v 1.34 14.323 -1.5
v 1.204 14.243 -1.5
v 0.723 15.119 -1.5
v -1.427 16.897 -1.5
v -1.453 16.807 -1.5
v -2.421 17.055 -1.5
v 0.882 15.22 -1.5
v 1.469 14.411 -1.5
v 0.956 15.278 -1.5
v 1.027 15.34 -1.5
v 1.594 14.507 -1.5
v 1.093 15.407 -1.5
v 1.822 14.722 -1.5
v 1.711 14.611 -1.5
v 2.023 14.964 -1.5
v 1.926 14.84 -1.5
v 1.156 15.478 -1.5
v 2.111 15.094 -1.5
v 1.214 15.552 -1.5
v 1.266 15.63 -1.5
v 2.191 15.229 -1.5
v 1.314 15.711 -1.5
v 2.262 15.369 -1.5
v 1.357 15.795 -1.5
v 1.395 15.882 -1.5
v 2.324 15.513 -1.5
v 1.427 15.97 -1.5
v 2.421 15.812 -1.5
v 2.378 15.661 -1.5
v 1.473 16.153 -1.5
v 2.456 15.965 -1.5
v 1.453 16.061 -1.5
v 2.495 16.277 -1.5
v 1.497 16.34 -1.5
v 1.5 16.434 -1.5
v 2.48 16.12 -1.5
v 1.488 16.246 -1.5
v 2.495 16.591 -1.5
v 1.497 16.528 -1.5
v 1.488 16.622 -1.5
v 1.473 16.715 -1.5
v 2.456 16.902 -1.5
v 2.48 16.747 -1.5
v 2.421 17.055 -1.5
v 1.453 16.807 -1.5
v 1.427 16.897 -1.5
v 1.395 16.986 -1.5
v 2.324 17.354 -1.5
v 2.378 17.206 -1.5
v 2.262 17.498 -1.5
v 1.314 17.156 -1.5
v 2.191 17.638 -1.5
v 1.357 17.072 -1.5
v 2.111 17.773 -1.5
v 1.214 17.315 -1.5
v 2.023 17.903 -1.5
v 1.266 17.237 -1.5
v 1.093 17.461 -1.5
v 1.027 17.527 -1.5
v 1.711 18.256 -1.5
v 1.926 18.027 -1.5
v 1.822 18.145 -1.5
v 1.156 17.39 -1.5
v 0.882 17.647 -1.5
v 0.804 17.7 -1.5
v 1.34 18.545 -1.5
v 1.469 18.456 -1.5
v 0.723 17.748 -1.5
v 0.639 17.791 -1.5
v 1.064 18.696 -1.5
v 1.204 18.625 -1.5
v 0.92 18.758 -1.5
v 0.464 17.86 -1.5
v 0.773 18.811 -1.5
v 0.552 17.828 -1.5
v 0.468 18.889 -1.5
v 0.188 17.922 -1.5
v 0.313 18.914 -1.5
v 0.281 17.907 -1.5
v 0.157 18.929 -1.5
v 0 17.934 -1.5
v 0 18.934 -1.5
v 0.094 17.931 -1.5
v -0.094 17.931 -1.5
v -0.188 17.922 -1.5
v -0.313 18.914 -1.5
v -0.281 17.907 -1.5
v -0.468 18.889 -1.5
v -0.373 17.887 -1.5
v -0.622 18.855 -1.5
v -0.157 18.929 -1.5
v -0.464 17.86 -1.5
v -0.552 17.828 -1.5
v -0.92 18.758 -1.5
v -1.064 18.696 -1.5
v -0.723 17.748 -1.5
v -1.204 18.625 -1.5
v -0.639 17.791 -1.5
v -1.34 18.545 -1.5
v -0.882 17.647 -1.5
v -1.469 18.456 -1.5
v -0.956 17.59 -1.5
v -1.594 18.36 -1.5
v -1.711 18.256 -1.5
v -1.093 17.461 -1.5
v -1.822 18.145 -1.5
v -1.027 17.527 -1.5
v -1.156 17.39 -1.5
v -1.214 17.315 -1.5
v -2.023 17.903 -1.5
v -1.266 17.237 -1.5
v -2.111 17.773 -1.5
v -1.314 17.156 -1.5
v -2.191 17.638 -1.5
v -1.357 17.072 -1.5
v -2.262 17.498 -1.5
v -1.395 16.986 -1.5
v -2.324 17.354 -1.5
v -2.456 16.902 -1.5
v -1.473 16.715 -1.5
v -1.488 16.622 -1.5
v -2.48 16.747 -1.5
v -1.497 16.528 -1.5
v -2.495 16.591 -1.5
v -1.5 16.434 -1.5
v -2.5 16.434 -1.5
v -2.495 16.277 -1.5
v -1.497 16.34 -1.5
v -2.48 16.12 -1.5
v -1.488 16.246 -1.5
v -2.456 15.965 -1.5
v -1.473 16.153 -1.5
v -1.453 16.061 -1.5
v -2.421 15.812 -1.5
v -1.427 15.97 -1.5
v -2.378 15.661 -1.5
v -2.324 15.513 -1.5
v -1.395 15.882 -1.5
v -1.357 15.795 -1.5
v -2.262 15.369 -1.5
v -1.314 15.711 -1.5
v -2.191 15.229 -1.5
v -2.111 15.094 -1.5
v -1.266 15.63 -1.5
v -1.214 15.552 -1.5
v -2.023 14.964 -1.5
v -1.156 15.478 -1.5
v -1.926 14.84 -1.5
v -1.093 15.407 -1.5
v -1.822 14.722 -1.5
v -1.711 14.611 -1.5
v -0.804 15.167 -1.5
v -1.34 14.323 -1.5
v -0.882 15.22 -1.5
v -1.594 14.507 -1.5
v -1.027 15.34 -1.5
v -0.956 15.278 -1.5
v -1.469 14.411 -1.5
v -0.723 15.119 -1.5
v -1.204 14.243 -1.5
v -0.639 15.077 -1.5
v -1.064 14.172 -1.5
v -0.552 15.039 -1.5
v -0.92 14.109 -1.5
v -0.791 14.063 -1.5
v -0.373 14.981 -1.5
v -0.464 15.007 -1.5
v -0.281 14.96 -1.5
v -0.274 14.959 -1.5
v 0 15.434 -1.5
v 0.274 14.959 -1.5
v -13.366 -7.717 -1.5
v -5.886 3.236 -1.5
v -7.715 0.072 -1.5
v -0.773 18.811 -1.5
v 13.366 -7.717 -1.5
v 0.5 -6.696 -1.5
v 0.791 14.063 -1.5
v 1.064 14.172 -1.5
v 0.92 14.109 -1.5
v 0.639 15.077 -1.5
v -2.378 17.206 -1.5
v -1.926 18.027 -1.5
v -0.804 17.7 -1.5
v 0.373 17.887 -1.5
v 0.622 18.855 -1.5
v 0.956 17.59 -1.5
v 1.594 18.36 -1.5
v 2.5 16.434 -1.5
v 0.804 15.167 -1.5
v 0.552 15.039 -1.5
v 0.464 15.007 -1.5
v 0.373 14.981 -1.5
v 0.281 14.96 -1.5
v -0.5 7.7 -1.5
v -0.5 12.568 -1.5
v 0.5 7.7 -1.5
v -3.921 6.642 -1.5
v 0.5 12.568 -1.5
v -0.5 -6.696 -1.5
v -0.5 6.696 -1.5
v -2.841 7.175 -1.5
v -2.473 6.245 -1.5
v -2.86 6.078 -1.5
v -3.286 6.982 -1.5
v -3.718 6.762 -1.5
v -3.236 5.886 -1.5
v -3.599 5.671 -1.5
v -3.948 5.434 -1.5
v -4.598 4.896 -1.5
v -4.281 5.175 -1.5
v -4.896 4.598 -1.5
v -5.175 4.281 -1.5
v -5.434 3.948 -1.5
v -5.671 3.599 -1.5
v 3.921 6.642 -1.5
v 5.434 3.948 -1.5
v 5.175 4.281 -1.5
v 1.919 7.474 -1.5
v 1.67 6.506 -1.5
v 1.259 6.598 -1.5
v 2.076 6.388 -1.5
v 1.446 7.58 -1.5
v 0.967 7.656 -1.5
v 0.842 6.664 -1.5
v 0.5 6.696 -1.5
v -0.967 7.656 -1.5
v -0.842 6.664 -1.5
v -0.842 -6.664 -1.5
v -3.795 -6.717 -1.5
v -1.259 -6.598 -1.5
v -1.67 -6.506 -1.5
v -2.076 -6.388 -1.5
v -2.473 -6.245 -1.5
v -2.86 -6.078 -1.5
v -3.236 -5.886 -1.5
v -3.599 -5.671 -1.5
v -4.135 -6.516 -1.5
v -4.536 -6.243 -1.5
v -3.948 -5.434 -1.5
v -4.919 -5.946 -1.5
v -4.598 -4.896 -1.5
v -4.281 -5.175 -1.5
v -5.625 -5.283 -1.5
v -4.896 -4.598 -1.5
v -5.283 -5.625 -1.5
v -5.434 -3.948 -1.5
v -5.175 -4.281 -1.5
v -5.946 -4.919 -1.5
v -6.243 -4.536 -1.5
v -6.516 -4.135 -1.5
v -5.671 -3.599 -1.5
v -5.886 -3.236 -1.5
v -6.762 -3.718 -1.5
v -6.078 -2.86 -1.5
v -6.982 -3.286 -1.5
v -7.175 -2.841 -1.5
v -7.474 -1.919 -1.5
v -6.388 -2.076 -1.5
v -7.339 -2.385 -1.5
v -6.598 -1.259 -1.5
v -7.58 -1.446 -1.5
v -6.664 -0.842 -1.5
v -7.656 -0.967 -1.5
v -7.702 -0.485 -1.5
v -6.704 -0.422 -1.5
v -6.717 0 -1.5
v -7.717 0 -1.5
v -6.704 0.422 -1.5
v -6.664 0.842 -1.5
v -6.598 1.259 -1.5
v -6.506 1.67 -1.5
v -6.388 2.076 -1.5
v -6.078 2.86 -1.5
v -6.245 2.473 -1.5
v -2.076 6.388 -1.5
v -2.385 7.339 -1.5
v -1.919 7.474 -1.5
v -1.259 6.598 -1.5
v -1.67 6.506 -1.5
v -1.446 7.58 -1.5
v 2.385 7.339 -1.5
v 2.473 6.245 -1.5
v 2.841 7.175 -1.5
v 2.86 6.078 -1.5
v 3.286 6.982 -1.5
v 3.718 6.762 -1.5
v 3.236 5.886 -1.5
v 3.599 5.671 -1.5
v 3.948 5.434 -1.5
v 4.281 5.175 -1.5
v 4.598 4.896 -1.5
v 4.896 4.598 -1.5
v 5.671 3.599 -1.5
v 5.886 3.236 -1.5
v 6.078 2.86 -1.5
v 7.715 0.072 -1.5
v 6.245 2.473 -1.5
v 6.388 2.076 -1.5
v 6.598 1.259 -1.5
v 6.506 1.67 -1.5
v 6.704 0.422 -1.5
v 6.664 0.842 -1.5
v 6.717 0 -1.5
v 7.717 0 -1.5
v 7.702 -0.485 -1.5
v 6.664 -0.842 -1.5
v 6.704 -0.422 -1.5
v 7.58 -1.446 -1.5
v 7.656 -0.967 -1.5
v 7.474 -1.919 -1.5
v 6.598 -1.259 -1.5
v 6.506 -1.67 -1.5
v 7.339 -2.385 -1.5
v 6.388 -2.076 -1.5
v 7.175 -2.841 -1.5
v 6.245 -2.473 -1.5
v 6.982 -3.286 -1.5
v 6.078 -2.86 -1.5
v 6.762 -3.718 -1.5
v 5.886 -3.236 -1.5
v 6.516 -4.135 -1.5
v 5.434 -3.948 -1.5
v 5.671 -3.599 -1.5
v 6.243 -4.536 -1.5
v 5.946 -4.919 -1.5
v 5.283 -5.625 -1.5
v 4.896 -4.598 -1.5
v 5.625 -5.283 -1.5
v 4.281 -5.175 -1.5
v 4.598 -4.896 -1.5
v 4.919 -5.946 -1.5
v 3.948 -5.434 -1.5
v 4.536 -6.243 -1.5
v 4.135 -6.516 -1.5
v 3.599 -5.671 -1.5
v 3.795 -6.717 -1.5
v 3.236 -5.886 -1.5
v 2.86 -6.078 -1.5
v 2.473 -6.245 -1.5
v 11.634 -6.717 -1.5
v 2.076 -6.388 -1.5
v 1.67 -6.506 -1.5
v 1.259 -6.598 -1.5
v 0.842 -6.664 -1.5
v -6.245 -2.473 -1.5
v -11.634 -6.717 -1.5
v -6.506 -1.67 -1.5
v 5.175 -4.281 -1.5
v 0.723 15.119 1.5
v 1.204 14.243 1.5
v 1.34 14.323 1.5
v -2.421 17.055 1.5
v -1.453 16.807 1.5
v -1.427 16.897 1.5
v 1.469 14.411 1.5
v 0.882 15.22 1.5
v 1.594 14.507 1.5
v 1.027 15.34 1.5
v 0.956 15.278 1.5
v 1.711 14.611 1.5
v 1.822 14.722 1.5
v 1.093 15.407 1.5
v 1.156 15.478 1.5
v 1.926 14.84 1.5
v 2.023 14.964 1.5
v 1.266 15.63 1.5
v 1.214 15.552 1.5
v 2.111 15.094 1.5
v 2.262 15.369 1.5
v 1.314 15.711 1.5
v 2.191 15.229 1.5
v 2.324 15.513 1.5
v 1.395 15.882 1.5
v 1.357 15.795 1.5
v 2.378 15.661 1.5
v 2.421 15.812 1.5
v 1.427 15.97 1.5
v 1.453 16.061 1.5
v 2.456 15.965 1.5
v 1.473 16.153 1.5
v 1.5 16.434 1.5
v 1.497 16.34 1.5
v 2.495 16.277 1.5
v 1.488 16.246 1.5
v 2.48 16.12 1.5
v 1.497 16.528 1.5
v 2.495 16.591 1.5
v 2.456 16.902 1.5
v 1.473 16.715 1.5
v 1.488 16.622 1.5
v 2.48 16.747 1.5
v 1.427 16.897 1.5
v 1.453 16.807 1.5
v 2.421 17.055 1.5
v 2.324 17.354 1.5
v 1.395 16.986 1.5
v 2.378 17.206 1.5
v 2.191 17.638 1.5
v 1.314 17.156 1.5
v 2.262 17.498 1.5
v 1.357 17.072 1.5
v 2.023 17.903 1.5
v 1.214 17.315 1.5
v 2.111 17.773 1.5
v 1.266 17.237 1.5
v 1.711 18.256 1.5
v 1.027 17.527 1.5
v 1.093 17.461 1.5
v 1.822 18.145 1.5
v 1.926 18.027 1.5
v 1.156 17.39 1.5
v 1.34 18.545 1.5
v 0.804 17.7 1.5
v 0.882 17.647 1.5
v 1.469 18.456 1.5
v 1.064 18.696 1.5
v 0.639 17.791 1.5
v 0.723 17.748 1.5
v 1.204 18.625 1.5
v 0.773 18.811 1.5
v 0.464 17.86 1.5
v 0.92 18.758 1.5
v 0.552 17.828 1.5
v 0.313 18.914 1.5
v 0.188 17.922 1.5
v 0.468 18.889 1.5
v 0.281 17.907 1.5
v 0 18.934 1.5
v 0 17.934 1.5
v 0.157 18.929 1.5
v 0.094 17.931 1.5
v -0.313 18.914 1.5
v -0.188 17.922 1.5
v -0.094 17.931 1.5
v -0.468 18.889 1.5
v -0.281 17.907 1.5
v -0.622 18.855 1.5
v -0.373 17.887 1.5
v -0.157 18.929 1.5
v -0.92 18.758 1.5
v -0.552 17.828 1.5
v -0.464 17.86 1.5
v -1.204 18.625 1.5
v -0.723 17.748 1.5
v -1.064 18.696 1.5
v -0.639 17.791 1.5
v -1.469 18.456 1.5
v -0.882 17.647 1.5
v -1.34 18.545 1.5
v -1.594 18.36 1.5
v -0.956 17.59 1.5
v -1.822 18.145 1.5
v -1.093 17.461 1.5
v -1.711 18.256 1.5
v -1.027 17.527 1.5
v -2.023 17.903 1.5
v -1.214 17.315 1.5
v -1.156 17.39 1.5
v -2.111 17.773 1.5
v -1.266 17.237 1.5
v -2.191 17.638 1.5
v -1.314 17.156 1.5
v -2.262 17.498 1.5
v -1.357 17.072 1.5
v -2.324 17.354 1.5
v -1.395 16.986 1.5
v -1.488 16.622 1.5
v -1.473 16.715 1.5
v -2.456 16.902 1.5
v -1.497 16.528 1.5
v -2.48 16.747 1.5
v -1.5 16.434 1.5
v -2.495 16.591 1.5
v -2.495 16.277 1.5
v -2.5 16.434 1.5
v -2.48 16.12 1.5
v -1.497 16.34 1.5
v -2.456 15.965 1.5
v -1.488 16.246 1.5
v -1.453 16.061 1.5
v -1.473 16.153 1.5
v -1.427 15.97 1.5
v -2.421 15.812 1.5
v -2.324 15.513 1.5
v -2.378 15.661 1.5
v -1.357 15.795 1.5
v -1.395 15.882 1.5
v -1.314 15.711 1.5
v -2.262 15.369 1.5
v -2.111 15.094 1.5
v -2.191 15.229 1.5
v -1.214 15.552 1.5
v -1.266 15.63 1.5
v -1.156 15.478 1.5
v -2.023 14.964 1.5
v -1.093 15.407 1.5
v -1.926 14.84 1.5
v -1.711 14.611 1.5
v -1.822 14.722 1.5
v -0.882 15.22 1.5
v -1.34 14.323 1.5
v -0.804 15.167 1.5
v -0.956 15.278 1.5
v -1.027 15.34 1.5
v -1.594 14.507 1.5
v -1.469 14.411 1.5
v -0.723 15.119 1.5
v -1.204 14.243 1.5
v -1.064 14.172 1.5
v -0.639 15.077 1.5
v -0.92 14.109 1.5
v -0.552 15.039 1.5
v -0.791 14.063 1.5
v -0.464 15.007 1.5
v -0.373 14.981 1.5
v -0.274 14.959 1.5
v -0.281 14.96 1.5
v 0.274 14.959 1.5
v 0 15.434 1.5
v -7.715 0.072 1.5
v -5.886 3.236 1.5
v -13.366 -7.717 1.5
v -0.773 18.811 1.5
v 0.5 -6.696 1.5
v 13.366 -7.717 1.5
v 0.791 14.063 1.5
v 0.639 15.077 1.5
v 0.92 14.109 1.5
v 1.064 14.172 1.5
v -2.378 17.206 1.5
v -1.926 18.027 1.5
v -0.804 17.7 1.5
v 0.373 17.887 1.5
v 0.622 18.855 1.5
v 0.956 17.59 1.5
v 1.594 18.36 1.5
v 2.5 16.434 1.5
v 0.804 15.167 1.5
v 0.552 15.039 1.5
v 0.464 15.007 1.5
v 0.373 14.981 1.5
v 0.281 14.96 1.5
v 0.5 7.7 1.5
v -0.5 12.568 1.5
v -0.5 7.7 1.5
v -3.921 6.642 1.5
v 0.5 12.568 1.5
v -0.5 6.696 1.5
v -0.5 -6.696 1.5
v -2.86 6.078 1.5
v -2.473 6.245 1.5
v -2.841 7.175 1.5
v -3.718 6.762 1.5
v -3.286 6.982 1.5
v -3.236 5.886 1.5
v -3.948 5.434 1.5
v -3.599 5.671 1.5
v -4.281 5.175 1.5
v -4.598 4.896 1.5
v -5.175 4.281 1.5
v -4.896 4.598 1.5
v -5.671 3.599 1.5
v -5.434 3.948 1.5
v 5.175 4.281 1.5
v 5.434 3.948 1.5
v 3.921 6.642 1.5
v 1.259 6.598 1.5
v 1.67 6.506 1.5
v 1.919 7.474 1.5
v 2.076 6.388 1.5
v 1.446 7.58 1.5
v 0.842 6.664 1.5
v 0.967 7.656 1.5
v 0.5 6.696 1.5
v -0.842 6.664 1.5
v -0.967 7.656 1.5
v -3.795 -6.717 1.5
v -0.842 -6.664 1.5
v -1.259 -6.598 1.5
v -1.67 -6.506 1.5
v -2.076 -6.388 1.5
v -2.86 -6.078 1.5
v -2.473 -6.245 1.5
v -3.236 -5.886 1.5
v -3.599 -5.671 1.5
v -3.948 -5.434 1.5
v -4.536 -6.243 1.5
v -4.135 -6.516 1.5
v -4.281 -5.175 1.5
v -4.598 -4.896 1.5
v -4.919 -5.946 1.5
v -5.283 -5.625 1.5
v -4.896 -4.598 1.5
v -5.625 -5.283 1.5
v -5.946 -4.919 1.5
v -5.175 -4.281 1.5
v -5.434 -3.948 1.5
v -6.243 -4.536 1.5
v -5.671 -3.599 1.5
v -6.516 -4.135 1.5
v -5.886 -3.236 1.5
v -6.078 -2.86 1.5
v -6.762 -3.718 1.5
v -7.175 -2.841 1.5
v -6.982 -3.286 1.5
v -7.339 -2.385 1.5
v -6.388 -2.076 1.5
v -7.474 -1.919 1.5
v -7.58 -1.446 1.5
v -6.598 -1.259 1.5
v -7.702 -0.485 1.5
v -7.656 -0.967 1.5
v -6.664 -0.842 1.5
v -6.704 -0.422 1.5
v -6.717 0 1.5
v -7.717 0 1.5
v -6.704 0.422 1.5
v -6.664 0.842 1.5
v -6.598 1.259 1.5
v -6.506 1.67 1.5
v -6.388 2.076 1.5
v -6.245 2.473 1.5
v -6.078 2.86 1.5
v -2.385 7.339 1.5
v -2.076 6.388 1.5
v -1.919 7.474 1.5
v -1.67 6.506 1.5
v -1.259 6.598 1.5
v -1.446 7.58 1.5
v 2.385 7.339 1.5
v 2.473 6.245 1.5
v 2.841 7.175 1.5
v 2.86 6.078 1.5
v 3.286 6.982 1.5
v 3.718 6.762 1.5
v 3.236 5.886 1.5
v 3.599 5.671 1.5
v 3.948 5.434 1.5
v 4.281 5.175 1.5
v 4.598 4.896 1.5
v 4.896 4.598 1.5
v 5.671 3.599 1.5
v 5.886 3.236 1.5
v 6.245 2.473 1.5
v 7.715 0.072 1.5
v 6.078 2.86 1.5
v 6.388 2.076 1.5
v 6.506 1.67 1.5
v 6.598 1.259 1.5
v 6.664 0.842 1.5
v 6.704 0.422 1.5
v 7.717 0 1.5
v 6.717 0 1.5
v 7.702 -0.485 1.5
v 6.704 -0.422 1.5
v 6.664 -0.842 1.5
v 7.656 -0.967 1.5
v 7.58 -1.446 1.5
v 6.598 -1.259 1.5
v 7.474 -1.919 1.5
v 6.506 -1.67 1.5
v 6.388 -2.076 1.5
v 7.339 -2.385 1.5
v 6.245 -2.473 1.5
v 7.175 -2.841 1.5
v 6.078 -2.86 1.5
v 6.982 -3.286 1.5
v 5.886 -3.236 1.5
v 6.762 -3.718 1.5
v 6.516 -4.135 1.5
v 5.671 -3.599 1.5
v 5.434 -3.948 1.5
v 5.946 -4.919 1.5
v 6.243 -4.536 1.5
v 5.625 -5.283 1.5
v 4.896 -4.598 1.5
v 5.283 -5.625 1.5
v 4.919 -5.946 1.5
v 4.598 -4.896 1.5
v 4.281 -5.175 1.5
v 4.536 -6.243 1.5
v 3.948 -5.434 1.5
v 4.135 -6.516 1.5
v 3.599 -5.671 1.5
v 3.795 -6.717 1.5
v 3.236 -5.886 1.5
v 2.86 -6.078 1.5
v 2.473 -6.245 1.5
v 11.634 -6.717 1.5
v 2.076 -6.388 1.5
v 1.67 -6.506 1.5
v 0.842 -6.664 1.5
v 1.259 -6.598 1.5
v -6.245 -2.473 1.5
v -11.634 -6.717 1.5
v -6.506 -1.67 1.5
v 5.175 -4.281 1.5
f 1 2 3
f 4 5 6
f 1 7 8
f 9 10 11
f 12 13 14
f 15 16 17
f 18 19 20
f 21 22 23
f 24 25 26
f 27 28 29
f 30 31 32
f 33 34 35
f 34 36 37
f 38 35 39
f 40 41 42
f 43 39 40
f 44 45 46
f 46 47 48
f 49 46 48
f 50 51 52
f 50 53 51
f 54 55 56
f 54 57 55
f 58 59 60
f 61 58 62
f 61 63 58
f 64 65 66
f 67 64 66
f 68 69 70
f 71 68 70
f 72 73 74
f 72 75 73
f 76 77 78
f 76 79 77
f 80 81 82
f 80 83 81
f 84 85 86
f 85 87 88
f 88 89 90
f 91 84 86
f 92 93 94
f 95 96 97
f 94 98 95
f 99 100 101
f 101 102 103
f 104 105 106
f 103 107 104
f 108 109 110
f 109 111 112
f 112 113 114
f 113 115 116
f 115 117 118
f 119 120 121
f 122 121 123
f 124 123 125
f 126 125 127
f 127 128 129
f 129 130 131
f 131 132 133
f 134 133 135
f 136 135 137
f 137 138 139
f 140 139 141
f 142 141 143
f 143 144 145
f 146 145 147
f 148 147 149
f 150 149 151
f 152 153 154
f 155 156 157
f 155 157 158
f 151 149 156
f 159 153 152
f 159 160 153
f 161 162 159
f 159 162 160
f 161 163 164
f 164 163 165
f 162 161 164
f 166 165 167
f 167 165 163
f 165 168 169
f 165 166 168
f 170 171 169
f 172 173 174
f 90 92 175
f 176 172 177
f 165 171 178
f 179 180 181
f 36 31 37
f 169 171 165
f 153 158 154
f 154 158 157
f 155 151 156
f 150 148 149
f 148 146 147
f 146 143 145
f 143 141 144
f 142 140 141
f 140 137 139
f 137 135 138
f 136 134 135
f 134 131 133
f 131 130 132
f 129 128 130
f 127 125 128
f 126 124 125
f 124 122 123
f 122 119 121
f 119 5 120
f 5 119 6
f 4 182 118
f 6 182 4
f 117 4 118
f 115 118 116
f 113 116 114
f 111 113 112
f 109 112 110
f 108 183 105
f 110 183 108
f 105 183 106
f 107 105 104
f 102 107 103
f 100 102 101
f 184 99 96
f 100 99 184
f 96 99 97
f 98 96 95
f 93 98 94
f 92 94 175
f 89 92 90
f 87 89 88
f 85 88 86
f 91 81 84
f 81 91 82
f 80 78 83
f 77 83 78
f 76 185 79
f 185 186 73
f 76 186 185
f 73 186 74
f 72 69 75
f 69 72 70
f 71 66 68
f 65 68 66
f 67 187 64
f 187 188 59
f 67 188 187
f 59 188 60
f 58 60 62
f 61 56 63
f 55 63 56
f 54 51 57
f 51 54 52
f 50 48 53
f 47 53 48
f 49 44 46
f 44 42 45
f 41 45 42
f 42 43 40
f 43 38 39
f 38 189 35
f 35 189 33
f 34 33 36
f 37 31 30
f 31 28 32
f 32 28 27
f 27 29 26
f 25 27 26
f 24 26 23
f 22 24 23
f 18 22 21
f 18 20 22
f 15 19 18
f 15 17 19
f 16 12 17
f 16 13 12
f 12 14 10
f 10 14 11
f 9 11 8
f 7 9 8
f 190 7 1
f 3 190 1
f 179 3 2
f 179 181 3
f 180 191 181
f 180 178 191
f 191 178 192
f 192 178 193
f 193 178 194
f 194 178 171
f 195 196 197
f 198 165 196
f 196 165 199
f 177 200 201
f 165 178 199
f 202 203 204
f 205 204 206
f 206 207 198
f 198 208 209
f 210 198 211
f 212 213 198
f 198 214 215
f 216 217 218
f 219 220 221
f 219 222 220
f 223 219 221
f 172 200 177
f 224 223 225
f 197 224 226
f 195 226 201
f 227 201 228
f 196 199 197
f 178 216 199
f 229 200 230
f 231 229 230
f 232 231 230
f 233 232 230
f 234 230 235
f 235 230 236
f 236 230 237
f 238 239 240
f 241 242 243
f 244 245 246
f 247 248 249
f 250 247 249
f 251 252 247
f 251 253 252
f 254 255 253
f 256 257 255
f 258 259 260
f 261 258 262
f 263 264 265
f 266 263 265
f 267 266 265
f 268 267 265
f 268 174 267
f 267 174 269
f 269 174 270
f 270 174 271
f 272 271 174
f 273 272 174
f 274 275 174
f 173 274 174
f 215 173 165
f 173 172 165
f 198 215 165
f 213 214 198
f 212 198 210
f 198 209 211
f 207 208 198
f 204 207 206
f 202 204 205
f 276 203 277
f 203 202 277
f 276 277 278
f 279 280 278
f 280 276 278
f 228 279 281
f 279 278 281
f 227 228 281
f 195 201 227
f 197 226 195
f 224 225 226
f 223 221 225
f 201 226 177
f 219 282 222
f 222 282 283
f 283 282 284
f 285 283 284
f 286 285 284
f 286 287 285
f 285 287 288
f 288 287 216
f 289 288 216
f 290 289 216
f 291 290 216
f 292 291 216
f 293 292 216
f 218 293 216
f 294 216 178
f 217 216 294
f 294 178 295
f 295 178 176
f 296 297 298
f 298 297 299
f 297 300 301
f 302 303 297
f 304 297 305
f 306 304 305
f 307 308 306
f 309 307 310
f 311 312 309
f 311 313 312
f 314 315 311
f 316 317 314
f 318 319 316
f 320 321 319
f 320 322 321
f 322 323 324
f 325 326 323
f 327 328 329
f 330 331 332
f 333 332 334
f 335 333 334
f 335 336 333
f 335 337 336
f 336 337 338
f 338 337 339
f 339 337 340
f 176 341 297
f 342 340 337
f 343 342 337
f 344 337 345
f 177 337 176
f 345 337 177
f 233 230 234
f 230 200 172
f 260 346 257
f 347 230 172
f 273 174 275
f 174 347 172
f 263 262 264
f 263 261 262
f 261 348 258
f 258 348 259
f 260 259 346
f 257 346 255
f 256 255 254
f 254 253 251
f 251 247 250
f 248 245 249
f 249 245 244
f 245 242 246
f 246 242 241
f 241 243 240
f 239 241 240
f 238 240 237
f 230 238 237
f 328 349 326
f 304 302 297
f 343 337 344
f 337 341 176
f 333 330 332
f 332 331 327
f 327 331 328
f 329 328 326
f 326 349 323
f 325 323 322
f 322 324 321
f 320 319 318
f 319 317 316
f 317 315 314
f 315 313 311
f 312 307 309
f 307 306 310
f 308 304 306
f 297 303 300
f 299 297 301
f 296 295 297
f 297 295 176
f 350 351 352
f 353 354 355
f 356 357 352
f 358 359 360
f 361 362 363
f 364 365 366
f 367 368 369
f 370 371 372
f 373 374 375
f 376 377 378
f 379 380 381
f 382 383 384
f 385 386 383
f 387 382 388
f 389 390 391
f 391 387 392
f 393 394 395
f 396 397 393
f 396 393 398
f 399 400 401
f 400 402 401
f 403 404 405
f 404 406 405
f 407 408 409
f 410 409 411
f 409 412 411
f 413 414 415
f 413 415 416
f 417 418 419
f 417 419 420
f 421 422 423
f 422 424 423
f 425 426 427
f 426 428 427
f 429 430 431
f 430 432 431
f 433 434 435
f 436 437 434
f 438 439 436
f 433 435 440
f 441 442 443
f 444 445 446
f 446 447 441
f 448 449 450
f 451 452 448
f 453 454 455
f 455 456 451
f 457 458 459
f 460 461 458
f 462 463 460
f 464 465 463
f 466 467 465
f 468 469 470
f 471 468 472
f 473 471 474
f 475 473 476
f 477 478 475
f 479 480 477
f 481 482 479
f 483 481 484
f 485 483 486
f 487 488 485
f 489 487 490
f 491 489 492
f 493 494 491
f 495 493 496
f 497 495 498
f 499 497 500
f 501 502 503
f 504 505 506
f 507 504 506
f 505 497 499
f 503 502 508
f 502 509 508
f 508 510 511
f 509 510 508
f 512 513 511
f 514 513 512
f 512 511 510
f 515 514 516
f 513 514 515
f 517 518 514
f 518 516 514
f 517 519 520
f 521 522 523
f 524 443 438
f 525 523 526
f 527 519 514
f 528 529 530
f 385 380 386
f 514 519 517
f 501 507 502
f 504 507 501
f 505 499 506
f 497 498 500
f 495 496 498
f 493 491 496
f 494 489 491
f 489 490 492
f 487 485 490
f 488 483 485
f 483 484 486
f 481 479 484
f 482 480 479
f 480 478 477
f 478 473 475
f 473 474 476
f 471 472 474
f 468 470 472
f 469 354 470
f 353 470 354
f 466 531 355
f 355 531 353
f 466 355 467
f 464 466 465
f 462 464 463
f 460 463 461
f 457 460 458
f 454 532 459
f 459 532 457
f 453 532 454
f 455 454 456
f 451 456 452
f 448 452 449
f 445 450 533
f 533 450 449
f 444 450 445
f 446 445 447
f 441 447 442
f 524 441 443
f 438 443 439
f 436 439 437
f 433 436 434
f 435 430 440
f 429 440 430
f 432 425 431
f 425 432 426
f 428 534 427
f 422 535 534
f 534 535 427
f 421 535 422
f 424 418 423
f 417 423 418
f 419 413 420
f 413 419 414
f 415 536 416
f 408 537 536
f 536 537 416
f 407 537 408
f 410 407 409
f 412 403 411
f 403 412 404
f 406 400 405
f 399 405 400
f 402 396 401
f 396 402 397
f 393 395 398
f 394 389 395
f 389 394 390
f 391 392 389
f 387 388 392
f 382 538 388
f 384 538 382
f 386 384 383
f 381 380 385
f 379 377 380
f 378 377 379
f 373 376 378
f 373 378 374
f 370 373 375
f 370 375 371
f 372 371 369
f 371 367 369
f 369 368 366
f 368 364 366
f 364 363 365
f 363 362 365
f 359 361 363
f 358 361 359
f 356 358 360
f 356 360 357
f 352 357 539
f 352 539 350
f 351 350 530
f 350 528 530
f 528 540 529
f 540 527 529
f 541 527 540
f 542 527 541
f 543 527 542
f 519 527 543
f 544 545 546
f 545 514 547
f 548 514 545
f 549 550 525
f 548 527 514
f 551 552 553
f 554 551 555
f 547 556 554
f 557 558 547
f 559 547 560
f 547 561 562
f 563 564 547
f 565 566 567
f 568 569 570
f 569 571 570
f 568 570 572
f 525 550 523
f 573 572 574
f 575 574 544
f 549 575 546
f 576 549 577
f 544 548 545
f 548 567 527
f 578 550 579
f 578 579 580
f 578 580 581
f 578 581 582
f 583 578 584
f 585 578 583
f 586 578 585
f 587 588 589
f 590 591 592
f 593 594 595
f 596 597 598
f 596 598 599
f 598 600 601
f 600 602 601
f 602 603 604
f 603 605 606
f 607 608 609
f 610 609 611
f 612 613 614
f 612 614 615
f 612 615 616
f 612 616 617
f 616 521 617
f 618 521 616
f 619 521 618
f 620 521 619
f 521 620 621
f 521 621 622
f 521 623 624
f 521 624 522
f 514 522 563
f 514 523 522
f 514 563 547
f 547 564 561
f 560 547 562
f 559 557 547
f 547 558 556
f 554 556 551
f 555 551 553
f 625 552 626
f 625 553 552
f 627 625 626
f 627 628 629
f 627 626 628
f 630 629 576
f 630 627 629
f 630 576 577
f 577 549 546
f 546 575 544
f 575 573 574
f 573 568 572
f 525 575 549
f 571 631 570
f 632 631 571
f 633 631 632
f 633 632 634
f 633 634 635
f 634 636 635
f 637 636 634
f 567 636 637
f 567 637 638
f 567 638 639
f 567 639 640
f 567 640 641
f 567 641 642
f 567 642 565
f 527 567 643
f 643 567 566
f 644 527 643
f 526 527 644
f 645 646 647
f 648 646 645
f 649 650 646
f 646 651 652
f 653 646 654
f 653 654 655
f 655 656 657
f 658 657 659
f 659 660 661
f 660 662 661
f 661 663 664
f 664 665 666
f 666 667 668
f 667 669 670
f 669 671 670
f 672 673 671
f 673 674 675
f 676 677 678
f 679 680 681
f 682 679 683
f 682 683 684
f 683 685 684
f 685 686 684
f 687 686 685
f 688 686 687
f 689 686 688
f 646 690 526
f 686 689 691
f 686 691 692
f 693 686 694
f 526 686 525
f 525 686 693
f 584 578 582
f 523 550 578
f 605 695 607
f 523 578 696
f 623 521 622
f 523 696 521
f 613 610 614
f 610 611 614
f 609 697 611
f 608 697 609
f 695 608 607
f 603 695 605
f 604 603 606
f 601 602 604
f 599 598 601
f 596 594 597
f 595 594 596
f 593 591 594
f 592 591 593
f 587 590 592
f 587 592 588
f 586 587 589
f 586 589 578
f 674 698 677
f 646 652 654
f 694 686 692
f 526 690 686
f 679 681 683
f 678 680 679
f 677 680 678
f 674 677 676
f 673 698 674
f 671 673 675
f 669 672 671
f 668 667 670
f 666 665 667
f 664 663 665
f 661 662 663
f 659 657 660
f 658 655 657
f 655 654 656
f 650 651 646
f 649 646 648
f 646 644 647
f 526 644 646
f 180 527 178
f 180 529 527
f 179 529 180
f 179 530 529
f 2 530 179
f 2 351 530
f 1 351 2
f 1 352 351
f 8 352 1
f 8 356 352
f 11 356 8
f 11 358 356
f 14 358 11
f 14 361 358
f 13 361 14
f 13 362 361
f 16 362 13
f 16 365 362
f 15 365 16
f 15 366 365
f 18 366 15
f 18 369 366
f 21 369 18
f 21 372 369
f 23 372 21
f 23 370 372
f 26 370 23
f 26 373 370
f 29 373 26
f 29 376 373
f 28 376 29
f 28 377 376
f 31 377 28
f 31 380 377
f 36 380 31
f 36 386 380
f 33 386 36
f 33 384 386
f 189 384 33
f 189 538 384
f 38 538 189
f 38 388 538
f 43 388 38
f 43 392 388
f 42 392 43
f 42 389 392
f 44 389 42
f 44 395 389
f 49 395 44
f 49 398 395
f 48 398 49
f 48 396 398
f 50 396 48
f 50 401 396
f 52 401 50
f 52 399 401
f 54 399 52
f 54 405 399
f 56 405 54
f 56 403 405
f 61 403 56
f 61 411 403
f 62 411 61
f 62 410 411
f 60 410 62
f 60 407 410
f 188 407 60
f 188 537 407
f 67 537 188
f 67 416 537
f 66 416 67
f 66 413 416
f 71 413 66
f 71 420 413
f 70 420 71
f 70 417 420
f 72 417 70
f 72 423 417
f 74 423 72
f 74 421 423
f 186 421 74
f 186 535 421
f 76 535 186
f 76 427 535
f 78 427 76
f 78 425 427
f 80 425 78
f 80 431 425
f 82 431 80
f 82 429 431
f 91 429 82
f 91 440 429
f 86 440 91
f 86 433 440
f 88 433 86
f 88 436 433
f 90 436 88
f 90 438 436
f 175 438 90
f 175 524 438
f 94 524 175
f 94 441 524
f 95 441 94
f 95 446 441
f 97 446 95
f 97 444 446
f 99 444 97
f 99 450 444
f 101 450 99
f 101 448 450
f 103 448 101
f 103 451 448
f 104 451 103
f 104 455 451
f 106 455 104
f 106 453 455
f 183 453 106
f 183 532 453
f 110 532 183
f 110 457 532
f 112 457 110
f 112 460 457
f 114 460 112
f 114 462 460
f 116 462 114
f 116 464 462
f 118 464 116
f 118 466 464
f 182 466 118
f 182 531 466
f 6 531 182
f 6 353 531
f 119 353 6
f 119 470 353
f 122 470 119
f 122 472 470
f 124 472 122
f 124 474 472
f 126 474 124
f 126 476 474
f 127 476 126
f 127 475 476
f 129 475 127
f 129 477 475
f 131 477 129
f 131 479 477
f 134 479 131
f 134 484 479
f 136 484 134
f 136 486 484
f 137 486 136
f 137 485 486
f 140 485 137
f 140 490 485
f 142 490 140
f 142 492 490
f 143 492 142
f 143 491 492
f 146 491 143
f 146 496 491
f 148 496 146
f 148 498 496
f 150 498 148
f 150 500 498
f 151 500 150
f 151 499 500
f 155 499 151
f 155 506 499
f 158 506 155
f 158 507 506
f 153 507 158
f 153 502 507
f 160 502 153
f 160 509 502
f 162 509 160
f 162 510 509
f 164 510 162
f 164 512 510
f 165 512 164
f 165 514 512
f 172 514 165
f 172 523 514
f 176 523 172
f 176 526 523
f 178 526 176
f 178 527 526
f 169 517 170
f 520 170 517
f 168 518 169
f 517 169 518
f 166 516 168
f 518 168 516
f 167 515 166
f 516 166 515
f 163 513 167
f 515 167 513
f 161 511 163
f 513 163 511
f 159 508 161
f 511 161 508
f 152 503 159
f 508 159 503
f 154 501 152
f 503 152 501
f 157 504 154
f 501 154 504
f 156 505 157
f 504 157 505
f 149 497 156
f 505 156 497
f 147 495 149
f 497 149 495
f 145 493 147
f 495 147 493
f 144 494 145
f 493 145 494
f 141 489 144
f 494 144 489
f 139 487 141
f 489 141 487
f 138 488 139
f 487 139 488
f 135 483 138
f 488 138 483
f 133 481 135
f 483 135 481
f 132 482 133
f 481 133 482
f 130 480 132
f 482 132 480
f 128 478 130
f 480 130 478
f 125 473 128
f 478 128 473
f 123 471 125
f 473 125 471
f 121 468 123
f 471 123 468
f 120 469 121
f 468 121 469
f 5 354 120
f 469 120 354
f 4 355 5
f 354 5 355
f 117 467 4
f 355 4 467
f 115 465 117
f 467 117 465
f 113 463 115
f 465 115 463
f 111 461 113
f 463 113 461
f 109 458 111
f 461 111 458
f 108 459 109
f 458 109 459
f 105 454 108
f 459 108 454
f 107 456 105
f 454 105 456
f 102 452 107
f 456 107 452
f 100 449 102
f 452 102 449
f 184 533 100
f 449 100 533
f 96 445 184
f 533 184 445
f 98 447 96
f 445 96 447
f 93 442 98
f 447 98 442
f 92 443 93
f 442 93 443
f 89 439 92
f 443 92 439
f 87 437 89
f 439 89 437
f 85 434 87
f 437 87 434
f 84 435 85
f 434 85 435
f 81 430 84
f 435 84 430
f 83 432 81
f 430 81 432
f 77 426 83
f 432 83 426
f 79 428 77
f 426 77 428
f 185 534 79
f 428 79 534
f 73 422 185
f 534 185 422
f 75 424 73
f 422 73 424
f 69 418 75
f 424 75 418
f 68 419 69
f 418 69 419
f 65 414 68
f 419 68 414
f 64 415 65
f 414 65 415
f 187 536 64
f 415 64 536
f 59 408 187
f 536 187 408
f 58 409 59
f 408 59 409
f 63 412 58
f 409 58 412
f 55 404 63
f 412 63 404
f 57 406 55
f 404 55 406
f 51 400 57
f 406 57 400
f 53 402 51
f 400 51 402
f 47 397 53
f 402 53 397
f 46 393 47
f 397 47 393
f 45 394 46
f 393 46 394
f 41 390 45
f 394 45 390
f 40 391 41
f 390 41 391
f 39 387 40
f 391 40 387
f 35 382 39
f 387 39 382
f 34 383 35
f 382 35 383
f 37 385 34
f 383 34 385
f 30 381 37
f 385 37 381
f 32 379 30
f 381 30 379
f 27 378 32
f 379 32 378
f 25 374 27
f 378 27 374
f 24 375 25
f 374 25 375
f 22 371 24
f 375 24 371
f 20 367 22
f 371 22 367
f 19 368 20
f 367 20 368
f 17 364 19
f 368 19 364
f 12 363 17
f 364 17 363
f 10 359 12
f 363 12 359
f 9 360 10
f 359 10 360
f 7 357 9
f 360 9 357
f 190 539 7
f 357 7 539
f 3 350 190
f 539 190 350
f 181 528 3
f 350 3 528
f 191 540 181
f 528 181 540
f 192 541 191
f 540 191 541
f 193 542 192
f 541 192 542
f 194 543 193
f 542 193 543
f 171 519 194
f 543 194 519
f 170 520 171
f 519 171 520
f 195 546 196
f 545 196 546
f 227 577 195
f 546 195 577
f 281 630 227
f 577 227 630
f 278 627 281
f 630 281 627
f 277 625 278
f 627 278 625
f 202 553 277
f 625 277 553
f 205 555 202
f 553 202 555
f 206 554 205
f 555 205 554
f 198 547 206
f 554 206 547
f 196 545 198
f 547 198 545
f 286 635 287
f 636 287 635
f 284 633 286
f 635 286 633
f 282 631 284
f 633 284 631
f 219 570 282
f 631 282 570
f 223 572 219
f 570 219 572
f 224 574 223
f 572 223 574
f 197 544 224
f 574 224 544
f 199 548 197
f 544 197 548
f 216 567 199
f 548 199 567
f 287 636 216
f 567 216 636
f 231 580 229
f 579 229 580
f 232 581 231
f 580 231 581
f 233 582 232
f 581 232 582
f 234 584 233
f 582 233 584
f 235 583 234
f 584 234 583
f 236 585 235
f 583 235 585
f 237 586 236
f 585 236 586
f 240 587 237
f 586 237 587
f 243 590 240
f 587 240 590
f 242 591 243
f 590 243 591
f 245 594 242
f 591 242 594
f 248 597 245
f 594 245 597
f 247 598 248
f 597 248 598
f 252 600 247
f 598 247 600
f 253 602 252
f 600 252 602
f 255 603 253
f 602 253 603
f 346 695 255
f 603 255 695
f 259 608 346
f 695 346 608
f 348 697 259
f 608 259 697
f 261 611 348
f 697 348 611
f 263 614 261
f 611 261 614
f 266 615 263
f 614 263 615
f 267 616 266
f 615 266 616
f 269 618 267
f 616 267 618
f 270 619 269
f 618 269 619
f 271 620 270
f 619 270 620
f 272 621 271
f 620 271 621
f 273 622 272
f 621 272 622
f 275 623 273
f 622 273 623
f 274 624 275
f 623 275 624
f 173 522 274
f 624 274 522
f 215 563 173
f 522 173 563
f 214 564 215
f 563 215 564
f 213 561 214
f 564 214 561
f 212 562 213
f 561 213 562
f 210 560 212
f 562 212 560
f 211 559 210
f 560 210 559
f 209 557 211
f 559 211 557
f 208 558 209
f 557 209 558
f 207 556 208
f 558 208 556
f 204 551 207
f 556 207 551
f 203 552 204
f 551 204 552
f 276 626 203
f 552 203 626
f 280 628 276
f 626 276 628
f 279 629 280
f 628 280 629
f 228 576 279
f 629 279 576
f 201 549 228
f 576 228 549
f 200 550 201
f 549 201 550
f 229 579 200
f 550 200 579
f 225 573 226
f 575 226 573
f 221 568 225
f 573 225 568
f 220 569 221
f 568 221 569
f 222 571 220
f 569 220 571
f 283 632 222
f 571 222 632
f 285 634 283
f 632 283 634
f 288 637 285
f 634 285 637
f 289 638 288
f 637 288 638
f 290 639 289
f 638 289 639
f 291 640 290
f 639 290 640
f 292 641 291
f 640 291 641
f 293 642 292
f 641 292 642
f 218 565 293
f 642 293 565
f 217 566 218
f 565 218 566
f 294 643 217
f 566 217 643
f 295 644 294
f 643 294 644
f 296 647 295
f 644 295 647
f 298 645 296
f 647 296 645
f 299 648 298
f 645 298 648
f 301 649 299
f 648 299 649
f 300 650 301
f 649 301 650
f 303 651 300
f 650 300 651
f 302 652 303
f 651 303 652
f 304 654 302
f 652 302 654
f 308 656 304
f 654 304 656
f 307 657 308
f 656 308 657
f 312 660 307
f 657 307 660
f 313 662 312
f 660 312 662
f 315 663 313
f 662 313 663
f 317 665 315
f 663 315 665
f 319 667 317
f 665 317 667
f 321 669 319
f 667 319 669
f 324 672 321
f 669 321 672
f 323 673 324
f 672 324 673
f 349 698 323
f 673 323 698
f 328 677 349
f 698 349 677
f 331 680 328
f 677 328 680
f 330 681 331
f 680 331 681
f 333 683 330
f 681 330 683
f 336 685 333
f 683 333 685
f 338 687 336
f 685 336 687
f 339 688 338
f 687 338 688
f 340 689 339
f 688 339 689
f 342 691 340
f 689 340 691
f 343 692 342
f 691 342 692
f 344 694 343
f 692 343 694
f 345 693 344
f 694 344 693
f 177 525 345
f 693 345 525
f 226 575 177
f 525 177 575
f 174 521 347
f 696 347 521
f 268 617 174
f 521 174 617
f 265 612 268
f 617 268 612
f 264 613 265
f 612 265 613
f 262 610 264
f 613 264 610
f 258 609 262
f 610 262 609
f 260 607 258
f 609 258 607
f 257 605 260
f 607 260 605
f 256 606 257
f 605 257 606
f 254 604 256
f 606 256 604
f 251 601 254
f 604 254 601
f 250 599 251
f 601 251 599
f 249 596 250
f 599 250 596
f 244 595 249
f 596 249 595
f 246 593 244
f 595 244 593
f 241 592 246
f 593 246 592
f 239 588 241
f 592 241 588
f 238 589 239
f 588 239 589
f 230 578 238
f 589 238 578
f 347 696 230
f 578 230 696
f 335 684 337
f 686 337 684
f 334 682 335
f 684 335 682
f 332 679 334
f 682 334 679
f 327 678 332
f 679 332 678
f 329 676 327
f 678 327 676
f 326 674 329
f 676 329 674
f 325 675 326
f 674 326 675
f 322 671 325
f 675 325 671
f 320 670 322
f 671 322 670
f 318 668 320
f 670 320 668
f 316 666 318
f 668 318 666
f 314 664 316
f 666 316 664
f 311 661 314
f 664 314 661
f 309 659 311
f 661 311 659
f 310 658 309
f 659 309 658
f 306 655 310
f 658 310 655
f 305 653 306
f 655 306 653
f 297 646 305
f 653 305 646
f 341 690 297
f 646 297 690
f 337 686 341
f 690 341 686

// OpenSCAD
/*

create the Harry Potter "Deathly Hallows" symbol


*/


//--------------------------------------------------------------------------------
// independent parameters
s=25;          // [mm] the length of the side of the equilateral triangle
w=1;           // [mm] the width of each side
thickness=3;   // [mm] z-dimension
r_earring = 2; // [mm] radius of ring to attach earring

$fn=100;       // # of edges used to approximate circle

//--------------------------------------------------------------------------------

module ring(r, w) {
	difference() {
		circle( r=r+w/2 );
		circle( r=r-w/2 );
	}
}

module triangle(s) {
	d = s/sqrt(3);
	polygon( [ [0,d], [-s/2,-d/2], [s/2, -d/2]] );
}


module bar(s, w) {
	d = s/sqrt(3);
	polygon( [[w/2,d], [w/2,-d/2], [-w/2,-d/2], [-w/2,d] ] );

}

/*
The reference point for all of the following shapes is the center of the circle.
*/

module hp_symbol() {
	r = s/2/sqrt(3);
	union() {
		ring( r, w );

		difference() {
		triangle(s + sqrt(3)*w);
		triangle(s - sqrt(3)*w);
		}

		bar(s,w);

		translate( [0,s*sqrt(3)/3+r_earring,0] ) ring( r_earring, r_earring/2 );
	}
}

linear_extrude(height=thickness, center=true) hp_symbol();
